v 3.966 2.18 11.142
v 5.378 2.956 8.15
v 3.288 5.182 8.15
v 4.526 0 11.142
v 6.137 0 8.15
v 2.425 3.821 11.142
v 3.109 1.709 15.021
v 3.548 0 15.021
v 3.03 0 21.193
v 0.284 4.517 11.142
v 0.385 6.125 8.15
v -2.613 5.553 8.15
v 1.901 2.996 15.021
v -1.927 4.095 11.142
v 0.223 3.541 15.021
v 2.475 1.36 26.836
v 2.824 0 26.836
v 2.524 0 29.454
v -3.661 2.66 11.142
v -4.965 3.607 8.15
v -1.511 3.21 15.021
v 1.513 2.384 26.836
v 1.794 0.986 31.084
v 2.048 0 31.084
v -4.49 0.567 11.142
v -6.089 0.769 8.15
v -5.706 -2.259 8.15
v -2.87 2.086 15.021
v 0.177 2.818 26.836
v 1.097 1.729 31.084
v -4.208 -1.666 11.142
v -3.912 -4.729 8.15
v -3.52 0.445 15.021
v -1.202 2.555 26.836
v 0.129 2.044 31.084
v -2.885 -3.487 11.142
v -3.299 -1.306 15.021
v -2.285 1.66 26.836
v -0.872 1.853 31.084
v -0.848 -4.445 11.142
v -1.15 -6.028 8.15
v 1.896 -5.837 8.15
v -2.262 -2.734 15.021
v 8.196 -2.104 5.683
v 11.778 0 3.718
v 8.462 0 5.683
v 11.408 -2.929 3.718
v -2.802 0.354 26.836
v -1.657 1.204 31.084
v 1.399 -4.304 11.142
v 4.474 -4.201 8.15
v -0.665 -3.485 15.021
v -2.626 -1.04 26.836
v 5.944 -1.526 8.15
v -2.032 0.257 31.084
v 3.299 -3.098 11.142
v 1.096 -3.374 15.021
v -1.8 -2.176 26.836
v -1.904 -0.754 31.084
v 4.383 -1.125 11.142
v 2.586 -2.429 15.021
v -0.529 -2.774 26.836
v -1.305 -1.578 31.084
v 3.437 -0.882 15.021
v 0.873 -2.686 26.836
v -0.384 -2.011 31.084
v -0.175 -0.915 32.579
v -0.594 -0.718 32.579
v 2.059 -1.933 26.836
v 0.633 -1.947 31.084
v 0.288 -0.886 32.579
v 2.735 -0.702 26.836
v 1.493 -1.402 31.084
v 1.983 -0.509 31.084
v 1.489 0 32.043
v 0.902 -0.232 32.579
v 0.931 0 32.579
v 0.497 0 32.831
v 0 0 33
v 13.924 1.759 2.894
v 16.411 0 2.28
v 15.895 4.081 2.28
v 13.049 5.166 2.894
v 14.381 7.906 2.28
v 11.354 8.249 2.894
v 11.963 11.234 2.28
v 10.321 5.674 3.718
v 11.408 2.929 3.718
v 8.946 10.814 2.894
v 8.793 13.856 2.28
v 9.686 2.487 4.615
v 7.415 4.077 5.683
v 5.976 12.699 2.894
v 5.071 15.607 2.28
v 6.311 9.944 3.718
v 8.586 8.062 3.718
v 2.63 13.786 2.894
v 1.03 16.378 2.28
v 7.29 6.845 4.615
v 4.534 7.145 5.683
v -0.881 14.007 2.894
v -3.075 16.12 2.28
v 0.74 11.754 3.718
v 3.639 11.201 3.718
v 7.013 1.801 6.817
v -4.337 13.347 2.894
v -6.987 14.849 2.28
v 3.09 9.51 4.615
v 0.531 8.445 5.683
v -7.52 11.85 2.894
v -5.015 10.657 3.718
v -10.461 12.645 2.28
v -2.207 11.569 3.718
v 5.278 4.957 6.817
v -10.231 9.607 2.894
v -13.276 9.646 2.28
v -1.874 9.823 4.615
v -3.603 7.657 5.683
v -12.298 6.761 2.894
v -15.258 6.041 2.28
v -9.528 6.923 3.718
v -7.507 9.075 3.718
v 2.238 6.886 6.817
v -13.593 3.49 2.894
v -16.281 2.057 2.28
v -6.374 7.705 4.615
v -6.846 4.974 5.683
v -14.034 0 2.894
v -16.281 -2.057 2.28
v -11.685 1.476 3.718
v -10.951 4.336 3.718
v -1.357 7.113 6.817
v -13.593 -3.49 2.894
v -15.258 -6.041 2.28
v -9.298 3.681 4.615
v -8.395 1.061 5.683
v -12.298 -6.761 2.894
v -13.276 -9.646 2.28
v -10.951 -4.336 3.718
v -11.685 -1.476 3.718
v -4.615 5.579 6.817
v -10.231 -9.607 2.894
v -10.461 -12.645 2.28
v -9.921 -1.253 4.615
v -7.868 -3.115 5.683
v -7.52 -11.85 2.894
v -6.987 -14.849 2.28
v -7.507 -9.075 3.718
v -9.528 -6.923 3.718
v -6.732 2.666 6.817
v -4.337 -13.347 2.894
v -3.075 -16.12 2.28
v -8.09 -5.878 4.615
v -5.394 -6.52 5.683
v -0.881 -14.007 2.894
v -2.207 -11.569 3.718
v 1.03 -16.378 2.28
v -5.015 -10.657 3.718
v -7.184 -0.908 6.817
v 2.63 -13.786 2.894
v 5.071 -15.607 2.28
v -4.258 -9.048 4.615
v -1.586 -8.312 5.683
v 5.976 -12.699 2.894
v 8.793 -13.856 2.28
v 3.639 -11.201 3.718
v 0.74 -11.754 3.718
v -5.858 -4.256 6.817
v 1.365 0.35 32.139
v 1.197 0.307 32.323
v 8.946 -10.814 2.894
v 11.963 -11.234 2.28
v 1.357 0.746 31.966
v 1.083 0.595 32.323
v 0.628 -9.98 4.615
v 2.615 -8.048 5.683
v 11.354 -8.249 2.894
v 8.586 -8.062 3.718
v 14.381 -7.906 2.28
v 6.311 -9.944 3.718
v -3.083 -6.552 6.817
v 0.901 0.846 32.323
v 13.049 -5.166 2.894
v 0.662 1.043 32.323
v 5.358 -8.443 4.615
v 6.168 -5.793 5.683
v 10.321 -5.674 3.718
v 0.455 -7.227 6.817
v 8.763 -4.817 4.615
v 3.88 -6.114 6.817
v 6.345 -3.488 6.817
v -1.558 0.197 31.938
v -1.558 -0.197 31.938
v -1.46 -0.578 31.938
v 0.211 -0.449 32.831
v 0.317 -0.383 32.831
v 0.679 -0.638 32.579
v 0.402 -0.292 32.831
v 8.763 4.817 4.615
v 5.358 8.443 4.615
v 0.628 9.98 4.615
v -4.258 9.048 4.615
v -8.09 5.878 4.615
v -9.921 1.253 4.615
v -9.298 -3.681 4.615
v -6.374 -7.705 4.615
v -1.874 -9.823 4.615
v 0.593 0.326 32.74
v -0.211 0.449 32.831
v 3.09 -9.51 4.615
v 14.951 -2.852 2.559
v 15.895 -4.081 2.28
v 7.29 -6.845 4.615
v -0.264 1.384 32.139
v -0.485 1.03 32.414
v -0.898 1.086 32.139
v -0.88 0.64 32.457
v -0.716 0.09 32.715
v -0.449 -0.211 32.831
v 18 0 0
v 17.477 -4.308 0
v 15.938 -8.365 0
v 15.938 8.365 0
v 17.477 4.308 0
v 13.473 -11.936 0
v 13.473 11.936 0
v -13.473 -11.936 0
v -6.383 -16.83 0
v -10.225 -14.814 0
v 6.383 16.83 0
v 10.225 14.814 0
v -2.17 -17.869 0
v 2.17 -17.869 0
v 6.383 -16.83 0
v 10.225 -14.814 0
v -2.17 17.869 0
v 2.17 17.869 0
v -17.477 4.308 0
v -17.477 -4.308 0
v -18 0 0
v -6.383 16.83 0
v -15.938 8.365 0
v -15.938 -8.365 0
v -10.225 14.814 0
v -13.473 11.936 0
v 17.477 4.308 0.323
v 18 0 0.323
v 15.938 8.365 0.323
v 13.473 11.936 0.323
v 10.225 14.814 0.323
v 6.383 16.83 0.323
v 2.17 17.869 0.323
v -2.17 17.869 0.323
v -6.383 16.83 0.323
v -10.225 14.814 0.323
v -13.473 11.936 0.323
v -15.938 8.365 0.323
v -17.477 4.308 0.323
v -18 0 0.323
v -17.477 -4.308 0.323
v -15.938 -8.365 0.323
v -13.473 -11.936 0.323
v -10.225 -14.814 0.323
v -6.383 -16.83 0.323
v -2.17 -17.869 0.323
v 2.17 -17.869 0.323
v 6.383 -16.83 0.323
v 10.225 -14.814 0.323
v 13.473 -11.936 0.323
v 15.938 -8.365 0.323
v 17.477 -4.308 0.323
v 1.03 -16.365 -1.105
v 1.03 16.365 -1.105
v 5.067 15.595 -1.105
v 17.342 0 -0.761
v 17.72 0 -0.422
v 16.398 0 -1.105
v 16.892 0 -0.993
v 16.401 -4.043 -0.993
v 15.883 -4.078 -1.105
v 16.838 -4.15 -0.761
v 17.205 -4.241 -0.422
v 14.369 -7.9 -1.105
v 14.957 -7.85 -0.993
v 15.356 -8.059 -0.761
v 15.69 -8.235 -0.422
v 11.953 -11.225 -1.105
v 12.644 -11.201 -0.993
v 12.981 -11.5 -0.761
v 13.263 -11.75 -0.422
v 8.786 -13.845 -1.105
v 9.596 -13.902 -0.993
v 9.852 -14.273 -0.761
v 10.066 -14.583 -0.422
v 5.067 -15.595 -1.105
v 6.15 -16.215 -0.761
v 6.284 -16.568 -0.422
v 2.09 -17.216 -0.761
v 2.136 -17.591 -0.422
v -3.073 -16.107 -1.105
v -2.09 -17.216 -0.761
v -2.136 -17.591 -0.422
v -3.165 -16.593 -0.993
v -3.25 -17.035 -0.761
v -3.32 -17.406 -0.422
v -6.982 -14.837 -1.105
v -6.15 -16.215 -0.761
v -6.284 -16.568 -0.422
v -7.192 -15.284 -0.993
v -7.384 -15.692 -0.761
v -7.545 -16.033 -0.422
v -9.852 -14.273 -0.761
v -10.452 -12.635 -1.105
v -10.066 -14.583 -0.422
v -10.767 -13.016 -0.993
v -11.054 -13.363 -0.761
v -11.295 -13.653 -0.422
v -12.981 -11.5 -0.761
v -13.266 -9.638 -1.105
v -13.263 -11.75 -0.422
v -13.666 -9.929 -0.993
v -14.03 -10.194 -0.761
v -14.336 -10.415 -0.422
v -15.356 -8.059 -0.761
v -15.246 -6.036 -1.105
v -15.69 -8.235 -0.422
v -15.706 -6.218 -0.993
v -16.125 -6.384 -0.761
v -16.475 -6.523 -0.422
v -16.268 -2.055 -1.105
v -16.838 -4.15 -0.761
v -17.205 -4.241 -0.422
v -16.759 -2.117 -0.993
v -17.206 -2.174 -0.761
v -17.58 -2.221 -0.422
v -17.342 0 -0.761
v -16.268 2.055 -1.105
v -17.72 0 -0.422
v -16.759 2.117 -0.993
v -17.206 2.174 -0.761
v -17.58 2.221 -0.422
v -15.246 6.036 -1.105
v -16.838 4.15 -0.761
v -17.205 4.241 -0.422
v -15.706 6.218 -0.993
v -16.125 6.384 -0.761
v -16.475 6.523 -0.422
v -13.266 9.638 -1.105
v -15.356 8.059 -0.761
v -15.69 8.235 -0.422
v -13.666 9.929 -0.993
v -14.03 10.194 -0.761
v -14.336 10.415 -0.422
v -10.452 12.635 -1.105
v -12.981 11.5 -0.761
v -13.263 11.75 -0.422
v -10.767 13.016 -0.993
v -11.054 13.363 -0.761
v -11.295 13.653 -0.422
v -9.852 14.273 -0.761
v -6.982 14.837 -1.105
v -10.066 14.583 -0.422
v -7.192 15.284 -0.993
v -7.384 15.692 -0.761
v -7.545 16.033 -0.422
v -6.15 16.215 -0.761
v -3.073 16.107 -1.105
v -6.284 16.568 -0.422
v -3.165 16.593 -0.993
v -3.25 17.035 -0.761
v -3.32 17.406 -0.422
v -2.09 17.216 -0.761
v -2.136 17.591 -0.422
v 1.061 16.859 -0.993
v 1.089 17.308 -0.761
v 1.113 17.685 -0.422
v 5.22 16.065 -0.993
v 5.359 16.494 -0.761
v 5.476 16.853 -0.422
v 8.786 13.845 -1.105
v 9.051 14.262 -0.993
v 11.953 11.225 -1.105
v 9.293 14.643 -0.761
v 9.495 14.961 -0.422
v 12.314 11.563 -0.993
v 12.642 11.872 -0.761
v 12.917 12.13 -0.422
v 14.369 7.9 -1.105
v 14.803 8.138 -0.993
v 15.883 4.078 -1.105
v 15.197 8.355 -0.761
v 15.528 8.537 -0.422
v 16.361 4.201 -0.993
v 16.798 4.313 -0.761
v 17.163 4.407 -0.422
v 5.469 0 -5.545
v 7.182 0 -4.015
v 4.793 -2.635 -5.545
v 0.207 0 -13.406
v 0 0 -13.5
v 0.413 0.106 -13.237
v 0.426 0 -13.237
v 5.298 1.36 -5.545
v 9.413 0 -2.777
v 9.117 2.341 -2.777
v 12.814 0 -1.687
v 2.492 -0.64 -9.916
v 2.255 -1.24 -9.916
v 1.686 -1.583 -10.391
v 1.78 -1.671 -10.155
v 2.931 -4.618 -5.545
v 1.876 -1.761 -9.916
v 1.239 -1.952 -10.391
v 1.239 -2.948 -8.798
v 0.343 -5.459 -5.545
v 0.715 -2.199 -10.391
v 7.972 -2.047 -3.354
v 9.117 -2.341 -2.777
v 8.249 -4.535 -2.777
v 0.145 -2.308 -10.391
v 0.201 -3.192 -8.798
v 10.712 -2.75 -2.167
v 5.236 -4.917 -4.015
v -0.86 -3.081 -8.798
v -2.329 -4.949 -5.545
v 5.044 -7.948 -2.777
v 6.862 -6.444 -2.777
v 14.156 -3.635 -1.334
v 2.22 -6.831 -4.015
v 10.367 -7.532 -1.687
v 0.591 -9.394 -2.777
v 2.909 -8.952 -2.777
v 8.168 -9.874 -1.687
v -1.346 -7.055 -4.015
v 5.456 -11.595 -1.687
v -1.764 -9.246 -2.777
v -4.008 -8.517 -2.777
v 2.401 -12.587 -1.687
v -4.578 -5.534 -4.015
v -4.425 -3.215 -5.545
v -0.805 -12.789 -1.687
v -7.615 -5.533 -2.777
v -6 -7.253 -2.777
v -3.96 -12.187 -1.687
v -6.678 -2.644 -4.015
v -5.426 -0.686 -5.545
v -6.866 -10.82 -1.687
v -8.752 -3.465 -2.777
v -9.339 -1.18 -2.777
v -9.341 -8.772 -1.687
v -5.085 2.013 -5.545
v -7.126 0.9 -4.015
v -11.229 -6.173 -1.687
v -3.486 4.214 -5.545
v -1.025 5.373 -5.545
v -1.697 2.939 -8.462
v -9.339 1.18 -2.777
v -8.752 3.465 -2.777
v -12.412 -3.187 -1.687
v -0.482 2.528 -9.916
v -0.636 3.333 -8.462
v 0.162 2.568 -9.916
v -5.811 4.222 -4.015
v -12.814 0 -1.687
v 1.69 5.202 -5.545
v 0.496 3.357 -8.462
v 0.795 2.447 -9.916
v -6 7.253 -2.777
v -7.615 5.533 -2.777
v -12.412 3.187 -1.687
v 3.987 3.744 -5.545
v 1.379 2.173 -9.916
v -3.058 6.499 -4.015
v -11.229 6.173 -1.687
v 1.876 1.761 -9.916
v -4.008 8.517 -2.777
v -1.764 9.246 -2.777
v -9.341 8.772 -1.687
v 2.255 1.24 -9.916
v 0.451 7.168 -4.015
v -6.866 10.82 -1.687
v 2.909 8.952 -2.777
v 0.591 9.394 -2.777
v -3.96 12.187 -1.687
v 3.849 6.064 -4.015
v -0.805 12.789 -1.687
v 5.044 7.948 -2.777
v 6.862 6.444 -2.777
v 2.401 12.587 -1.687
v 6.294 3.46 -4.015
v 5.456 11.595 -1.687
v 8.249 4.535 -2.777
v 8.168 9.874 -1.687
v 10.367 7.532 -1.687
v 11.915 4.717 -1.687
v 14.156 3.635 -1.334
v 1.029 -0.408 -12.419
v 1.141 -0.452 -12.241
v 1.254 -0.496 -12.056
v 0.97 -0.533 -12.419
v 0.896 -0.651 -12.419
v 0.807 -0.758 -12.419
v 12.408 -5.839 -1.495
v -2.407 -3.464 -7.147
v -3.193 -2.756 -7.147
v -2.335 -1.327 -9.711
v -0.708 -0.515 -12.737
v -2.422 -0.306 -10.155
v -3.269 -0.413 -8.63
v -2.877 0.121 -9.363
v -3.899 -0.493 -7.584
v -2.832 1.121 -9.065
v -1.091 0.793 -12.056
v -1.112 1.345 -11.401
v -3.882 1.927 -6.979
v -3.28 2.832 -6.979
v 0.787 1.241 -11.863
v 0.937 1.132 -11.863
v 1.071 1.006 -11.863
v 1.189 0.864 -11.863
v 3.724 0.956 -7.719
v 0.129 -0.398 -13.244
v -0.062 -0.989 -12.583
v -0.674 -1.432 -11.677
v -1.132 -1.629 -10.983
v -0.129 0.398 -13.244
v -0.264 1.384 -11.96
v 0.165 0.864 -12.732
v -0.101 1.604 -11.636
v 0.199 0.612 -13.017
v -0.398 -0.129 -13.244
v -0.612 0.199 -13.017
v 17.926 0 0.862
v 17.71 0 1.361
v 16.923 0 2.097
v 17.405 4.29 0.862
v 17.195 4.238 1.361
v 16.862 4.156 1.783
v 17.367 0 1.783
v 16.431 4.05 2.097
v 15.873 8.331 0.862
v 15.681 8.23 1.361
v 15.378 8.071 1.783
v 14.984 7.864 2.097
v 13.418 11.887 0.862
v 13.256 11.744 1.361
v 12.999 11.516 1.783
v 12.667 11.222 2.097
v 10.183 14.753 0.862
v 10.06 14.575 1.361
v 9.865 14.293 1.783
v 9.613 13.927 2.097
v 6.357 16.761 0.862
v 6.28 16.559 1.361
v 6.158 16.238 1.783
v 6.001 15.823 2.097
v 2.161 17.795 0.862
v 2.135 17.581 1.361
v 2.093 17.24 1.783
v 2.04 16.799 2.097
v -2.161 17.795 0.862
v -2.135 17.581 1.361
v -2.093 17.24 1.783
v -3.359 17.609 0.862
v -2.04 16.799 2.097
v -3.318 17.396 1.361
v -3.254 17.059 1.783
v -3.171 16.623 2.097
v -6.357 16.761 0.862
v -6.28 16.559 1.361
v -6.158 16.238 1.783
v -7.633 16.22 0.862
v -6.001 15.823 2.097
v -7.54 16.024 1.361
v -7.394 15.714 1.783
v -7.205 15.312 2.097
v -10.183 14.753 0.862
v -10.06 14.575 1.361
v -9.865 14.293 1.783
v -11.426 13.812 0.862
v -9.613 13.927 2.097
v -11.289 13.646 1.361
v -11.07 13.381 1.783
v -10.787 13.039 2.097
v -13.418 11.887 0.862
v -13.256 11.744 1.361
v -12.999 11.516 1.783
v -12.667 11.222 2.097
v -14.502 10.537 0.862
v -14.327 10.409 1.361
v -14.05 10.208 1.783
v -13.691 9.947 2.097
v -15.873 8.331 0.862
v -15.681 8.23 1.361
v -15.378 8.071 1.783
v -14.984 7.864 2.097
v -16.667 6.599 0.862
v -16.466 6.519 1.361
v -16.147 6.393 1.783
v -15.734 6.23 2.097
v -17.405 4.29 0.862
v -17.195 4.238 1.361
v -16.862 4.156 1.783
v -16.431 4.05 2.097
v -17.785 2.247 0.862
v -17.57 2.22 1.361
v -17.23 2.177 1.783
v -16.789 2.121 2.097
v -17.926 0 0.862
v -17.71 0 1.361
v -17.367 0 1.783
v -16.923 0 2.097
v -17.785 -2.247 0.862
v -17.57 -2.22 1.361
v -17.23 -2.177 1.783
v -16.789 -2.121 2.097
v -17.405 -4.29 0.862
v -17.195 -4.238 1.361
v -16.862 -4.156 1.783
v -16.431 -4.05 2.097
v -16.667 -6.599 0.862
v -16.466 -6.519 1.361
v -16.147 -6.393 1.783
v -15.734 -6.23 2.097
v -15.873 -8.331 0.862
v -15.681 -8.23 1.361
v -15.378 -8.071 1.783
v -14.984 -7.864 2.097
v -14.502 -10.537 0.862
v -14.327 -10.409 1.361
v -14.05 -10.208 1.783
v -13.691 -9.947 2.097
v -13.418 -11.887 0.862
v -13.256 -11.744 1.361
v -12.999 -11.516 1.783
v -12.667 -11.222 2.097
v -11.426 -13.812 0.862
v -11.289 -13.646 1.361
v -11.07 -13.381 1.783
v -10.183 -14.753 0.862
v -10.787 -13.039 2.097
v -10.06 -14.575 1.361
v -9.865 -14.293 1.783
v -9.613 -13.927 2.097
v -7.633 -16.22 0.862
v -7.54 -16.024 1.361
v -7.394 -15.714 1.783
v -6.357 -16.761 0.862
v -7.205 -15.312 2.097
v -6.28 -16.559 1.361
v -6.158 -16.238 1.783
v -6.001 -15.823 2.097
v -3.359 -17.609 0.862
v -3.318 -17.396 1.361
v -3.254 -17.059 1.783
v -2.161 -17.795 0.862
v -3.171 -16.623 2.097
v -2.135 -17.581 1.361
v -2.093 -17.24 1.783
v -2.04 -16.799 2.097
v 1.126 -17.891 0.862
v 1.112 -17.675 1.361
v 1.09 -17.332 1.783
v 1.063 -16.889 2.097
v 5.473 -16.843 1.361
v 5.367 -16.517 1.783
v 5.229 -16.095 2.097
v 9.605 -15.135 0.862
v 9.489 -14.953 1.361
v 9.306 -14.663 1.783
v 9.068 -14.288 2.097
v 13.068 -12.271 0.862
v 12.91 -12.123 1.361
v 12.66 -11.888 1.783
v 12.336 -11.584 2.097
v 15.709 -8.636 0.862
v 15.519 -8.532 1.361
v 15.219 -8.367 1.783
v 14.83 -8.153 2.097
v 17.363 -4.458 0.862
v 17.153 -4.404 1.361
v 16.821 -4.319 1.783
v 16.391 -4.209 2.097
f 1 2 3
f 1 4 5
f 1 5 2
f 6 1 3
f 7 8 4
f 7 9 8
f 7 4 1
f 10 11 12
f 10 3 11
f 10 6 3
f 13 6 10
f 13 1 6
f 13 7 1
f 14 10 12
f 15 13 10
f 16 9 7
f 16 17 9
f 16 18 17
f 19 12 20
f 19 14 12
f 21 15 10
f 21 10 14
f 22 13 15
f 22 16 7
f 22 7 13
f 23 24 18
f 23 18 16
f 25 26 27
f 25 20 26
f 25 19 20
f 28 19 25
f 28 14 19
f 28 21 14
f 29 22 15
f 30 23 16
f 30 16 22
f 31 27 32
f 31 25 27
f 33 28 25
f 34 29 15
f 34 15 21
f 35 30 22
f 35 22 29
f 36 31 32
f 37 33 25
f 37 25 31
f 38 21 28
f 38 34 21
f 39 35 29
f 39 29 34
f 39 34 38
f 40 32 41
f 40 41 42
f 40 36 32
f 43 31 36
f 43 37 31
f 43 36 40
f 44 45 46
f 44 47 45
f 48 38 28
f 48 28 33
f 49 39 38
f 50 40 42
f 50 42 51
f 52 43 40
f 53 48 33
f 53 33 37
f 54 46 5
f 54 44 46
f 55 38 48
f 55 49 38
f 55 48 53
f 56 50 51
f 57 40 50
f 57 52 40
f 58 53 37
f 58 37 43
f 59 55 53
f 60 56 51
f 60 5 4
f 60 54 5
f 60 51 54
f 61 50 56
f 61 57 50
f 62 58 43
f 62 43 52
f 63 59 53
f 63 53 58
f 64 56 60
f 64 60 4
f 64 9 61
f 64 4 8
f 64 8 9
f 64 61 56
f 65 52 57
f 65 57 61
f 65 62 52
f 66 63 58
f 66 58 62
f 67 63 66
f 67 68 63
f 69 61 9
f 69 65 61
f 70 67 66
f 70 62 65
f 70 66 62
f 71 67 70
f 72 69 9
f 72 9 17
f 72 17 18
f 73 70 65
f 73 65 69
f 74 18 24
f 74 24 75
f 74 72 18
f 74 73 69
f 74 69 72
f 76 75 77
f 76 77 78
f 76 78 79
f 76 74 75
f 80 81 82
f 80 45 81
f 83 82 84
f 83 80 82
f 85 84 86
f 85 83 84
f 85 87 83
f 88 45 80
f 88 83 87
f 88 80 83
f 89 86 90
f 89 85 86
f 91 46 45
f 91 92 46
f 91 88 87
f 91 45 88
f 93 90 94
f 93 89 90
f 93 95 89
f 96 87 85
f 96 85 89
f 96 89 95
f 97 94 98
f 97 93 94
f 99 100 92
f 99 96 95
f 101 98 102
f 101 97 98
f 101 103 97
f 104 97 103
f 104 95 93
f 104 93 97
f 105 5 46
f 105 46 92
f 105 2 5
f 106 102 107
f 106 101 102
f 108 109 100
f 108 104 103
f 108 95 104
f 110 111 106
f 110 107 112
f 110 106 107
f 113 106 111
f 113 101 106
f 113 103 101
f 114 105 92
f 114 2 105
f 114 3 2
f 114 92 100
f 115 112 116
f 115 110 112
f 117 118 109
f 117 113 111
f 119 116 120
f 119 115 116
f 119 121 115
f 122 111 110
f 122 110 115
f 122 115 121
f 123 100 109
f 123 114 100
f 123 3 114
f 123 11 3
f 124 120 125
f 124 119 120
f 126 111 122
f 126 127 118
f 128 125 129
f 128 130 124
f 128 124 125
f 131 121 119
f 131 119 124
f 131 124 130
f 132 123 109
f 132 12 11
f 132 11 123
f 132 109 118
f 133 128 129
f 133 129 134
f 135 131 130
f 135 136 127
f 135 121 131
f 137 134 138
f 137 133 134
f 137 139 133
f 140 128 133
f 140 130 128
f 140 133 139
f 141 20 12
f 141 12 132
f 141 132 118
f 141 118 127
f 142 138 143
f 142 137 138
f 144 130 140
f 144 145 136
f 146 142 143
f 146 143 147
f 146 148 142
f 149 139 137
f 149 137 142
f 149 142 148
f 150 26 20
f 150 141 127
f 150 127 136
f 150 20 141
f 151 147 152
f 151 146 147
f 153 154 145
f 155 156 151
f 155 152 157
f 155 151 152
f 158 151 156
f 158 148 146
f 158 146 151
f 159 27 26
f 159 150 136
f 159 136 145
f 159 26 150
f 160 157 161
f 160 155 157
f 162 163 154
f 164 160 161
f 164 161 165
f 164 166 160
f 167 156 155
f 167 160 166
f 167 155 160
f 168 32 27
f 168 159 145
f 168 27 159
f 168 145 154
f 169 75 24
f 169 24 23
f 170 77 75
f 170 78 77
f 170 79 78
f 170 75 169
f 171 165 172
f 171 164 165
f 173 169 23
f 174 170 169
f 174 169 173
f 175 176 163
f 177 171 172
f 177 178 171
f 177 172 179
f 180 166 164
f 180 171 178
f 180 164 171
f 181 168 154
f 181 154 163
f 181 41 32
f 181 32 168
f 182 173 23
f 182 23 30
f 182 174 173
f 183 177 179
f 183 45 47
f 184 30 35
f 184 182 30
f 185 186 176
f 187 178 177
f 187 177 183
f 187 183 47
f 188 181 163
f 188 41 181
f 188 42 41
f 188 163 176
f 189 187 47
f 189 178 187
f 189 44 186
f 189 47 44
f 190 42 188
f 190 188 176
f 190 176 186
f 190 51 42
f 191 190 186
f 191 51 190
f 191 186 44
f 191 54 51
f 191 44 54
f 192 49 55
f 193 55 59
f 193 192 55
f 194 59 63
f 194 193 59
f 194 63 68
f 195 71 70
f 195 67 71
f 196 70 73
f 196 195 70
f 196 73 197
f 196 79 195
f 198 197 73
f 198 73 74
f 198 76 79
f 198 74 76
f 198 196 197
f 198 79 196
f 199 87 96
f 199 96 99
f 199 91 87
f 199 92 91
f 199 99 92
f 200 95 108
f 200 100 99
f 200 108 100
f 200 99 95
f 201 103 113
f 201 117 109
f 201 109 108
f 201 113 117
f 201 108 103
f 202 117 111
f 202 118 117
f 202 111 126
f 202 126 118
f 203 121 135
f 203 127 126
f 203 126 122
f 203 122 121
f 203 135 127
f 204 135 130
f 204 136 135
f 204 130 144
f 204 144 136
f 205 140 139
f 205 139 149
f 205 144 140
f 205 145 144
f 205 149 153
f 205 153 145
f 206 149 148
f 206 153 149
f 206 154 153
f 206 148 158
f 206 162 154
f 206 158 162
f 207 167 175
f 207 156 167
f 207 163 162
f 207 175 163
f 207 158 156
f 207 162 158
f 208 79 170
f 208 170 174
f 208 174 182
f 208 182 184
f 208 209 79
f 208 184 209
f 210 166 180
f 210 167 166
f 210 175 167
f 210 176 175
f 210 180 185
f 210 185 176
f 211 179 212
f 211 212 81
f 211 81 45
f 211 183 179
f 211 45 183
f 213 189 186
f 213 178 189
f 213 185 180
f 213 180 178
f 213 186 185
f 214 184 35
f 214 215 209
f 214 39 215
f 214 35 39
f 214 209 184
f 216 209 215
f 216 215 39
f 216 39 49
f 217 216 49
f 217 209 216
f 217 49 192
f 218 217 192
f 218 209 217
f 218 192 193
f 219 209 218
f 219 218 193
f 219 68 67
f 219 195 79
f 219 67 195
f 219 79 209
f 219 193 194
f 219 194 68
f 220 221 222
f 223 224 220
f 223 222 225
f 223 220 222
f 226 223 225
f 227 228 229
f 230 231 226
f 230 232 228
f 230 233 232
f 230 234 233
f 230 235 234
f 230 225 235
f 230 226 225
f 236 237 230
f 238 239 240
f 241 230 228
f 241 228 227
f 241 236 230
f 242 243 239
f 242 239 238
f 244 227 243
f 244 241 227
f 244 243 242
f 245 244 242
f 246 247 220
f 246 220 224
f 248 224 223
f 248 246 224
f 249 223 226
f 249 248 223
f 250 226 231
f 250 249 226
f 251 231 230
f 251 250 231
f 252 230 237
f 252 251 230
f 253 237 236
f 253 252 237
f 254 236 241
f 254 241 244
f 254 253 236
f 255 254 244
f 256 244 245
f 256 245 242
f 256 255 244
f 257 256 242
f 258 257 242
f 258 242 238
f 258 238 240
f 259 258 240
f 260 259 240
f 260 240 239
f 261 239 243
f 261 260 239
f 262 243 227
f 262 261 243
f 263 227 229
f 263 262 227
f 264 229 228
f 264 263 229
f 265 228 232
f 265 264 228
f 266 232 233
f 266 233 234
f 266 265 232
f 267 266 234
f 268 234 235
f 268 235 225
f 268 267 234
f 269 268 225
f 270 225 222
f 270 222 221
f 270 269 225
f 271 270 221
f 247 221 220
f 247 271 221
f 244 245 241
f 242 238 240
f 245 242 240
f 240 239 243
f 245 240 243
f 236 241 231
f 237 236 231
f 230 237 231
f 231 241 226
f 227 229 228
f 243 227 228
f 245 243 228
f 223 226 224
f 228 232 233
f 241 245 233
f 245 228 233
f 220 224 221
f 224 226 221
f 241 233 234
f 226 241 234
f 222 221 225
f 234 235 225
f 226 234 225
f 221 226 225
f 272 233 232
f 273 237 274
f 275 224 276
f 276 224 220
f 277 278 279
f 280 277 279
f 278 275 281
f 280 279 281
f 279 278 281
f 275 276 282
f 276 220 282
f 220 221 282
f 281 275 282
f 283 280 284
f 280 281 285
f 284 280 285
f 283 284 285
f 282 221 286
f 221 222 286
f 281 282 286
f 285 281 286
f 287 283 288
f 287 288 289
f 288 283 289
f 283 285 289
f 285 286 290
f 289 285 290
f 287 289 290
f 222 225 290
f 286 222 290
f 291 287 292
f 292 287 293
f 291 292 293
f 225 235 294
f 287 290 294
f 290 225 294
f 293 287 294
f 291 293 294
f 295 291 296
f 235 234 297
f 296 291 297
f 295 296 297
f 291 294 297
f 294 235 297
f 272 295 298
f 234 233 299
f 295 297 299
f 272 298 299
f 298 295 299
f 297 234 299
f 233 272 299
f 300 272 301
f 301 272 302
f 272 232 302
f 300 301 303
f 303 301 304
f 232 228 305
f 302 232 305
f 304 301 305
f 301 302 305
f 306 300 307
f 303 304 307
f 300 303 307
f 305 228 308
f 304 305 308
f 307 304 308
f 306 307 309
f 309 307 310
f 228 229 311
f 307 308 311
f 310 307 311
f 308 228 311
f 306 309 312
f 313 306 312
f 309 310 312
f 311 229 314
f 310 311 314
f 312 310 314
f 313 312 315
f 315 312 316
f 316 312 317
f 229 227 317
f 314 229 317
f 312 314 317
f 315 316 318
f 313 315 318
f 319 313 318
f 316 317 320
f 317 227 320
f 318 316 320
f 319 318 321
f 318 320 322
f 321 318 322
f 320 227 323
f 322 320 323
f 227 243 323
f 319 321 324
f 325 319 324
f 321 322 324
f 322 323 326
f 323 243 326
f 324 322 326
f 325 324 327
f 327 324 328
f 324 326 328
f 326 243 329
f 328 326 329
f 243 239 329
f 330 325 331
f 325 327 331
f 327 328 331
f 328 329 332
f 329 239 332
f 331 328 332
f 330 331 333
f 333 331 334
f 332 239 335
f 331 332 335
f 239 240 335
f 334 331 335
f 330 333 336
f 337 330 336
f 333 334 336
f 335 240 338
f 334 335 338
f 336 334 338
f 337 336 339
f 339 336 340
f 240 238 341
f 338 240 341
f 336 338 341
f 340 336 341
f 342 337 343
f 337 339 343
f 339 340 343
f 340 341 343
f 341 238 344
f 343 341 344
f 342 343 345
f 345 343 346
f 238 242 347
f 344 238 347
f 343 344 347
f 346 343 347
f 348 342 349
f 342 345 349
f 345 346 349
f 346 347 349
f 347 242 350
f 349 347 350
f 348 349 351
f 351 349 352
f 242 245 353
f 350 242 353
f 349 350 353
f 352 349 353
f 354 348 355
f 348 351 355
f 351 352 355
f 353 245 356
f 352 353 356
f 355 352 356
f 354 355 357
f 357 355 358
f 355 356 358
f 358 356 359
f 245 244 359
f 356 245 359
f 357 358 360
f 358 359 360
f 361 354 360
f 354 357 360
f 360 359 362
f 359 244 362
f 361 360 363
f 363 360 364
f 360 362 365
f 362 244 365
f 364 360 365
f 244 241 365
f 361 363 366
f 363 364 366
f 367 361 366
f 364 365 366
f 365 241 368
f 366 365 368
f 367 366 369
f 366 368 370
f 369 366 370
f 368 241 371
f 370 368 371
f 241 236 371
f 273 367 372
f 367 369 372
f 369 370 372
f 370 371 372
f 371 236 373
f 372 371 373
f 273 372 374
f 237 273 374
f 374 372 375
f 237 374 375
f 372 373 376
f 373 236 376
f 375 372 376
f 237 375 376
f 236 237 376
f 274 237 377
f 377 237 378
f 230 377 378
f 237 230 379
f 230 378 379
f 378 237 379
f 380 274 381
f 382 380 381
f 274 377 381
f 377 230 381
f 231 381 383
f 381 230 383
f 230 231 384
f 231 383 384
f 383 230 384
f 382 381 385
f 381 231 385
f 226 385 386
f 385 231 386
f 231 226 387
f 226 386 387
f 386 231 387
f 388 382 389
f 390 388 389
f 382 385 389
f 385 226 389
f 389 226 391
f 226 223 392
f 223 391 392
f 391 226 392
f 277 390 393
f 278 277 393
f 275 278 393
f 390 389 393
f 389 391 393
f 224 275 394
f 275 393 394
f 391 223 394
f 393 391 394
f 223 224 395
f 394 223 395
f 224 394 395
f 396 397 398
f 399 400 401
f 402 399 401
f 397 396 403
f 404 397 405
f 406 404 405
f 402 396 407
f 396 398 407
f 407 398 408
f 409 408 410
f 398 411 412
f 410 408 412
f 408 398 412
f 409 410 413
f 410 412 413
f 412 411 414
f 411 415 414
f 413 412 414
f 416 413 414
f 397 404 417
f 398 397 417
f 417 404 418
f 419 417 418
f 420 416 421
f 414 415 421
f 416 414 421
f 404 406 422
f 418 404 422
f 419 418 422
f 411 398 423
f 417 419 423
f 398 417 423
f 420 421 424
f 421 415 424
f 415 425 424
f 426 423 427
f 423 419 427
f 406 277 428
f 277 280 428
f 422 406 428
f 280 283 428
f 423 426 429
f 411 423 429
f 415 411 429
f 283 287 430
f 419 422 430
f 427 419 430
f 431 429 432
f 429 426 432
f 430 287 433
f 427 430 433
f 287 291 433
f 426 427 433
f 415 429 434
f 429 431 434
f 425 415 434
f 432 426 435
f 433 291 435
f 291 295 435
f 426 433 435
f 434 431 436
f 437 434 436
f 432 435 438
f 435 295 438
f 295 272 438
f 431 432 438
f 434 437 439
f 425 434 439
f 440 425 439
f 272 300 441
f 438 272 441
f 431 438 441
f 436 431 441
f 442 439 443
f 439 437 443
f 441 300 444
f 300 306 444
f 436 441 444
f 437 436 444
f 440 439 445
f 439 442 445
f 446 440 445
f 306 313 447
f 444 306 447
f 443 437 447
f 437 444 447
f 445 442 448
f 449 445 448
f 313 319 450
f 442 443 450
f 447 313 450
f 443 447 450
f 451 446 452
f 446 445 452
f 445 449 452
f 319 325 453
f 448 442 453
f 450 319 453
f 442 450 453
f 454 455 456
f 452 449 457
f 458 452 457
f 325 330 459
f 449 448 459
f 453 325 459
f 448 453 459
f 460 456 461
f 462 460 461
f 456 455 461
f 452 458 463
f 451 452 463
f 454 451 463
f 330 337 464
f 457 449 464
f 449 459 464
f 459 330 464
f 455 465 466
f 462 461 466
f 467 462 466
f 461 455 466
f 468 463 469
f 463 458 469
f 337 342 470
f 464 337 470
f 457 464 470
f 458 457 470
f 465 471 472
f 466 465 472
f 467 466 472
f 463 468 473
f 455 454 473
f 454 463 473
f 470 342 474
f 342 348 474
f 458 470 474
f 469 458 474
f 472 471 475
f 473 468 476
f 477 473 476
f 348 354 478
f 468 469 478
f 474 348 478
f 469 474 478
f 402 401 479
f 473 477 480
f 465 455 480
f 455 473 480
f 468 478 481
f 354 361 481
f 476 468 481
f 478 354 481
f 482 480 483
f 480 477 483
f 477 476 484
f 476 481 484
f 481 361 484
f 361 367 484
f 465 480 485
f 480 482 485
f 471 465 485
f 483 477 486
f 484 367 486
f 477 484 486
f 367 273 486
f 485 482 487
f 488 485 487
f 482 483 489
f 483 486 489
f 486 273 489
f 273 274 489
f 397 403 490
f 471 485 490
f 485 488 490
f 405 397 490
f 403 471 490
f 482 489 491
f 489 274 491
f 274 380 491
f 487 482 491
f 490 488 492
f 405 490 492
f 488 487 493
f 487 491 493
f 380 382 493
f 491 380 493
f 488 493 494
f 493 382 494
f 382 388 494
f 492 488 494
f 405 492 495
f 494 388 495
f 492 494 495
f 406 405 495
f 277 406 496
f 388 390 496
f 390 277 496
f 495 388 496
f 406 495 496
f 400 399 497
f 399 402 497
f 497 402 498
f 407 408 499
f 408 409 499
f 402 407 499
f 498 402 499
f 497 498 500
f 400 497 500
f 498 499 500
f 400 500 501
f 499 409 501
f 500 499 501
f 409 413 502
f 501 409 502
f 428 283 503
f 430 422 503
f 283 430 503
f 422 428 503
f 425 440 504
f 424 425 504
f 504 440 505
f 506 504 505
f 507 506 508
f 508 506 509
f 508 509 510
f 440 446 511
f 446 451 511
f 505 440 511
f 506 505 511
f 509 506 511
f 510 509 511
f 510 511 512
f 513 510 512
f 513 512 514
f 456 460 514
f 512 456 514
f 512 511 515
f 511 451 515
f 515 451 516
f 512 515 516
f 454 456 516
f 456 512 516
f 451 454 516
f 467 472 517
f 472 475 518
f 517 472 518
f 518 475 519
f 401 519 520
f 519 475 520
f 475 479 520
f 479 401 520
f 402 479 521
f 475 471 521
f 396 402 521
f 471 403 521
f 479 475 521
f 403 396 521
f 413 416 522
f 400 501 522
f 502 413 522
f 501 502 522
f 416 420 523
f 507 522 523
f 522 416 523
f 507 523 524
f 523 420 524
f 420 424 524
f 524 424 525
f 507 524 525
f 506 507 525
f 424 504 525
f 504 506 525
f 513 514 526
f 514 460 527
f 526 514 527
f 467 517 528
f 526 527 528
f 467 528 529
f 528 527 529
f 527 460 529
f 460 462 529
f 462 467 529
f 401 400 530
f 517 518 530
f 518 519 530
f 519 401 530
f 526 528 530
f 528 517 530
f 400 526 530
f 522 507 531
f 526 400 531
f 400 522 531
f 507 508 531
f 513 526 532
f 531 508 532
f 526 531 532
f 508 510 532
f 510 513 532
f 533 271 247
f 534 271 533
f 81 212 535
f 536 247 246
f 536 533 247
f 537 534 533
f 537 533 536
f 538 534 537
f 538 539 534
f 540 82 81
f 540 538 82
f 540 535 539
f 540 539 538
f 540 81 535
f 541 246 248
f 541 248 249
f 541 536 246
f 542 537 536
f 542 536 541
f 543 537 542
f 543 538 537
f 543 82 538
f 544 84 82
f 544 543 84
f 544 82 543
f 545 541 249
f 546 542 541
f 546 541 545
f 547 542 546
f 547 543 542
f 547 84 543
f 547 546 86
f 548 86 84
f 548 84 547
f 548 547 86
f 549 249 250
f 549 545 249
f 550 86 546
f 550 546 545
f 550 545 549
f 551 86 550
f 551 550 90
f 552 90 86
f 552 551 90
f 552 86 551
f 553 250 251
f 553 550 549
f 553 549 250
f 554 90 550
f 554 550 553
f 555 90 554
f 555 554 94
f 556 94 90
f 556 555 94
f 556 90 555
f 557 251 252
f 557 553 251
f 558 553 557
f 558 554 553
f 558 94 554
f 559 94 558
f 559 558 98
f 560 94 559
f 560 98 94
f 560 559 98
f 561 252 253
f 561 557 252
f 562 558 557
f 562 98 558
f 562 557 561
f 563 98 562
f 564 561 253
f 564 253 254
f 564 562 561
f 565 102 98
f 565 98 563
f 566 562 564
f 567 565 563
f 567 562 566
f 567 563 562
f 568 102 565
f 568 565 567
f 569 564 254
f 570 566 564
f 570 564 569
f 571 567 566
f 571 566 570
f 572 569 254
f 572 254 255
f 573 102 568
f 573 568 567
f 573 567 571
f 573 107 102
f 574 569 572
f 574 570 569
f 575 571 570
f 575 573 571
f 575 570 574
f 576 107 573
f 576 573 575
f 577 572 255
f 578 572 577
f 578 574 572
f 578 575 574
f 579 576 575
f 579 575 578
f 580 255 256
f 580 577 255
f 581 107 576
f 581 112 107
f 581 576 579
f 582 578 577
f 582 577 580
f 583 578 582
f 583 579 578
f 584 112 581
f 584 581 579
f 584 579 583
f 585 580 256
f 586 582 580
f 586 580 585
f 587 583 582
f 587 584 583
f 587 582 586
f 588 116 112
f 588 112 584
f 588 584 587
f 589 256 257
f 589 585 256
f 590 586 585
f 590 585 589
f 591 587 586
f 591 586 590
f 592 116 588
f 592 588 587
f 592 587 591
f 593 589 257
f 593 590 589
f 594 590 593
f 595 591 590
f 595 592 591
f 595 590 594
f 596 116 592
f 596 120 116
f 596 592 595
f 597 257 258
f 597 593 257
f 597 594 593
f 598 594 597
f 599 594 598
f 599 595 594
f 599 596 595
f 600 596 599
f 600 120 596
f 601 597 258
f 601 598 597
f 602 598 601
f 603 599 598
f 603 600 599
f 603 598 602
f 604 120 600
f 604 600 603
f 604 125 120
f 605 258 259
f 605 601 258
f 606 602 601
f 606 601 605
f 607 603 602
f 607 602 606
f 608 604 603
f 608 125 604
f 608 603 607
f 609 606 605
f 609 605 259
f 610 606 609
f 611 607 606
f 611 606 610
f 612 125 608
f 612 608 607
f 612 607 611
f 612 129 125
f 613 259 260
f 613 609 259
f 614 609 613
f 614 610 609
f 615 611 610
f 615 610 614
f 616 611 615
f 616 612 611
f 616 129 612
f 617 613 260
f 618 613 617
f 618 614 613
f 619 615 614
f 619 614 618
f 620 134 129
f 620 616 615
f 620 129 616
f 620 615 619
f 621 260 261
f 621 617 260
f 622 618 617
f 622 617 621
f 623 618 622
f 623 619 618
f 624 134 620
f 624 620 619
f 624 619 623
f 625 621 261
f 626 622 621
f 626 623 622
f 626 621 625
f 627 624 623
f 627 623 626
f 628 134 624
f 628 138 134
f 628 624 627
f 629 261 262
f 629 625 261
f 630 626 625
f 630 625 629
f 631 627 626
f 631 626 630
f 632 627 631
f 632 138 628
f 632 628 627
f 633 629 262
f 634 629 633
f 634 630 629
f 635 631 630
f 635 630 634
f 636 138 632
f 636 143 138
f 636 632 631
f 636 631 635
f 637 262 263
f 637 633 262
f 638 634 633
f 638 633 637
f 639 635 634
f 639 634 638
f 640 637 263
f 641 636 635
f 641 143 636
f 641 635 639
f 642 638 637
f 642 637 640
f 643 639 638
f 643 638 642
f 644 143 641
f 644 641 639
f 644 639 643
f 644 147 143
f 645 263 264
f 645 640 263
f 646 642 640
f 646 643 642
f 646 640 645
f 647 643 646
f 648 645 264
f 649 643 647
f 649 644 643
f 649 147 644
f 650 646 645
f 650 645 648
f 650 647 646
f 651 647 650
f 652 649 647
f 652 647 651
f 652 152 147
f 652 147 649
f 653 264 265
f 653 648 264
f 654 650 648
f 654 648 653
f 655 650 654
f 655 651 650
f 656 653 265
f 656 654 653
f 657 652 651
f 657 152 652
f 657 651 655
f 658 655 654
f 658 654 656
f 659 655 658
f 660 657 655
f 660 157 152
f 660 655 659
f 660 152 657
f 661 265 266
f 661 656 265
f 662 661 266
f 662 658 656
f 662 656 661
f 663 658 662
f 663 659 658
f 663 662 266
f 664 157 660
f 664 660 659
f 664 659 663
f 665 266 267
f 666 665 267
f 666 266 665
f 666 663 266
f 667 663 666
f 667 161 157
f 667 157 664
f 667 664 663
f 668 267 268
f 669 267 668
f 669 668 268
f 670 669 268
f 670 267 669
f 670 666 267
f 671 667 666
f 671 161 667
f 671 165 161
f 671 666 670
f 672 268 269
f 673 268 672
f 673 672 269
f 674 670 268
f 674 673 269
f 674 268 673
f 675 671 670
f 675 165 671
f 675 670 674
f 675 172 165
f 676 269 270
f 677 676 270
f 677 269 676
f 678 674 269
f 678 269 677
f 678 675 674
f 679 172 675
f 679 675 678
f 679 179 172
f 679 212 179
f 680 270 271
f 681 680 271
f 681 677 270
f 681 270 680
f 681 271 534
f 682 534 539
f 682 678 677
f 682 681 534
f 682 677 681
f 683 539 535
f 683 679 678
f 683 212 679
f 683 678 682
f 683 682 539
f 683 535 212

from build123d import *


# Not quite as in the source:
# - a fillet or chamfer that OpenCascade refuses, or shapes differently, is made with other operations: its cross-section is extruded or revolved along the edge and cut away or added


with BuildPart() as f1:
    # F0 (on Front) → F1 (revolve)
    with BuildSketch(Plane.XZ):
        with BuildLine():
            Line((0, 33), (0, 0))
            Line((0, 0), (18, 0))
            Line((18, 0), (18, 2))
            add(Edge.make_bspline(
                [(18, 2), (15.8767193278, 2.2997949203), (11.3169572026, 3.5400315099), (6.936903079, 6.6058969156), (3.2799320985, 12.4102253579), (2.9476917719, 23.598533786), (2.6811530149, 32.3646539521), (0, 33)],
                knots=[0, 0, 0, 0, 0.1873001398, 0.3513331882, 0.5318184857, 0.7827778744, 1, 1, 1, 1], degree=3))
        make_face()
    revolve(axis=Axis((0, 0, 16.5), (0, 0, 1)))

    # F4: fillet of radius 2 on 1 edges, made by hand

    # F4_s1 → F4_t2 (revolve, cut)
    with BuildSketch(Plane.XZ):
        with BuildLine():
            ThreePointArc((18, 0.3228205545), (17.5526182459, 1.5835253505), (16.4106234174, 2.2802138234))
            Line((16.4106234174, 2.2802138234), (16.4188358857, 2.3193616887))
            ThreePointArc((16.4188358857, 2.3193616887), (17.2099496362, 2.1663384242), (18.0055922997, 2.0396071481))
            Line((18.0055922997, 2.0396071481), (18.04, 2))
            Line((18.04, 2), (18.04, 0.3228205545))
            Line((18.04, 0.3228205545), (18, 0.3228205545))
        make_face()
    revolve(axis=Axis((0, 0, 2), (0, 0, 1)), mode=Mode.SUBTRACT)


with BuildPart() as f3:
    # F2 (on Front) → F3 (revolve)
    with BuildSketch(Plane.XZ):
        with BuildLine():
            Line((18, 0), (0, 0))
            Line((0, 0), (0, -13.5))
            add(Edge.make_bspline(
                [(0, -13.5), (0.3537948145, -13.4052397407), (1.4715501043, -12.1117596027), (3.428359406, -8.101125754), (7.3765069909, -2.5539137252), (14.7296146505, -1.1124110975), (18, -1)],
                knots=[0, 0, 0, 0, 0.1423784213, 0.3722917637, 0.6506734348, 1, 1, 1, 1], degree=3))
            Line((18, -1), (18, 0))
        make_face()
    revolve(axis=Axis((0, 0, -6.75), (0, 0, -1)))

    # F4#2: fillet of radius 2 on 1 edges, made by hand

    # F4_2_s1 → F4_2_t2 (revolve, cut)
    with BuildSketch(Plane.XZ):
        with BuildLine():
            ThreePointArc((16.3976778659, -1.1053556528), (17.3423919425, -0.7607720845), (18, 0))
            Line((18, 0), (18.035865739, -0.0177101316))
            ThreePointArc((18.035865739, -0.0177101316), (18.04, -0.5), (18.04, -1))
            Line((18.04, -1), (18.0013740858, -1.0399763916))
            ThreePointArc((18.0013740858, -1.0399763916), (17.2006681044, -1.0803582257), (16.4014971623, -1.1451728975))
            Line((16.4014971623, -1.1451728975), (16.3976778659, -1.1053556528))
        make_face()
    revolve(axis=Axis((0, 0, -1), (0, 0, -1)), mode=Mode.SUBTRACT)


solid = Compound([f1.part, f3.part])
